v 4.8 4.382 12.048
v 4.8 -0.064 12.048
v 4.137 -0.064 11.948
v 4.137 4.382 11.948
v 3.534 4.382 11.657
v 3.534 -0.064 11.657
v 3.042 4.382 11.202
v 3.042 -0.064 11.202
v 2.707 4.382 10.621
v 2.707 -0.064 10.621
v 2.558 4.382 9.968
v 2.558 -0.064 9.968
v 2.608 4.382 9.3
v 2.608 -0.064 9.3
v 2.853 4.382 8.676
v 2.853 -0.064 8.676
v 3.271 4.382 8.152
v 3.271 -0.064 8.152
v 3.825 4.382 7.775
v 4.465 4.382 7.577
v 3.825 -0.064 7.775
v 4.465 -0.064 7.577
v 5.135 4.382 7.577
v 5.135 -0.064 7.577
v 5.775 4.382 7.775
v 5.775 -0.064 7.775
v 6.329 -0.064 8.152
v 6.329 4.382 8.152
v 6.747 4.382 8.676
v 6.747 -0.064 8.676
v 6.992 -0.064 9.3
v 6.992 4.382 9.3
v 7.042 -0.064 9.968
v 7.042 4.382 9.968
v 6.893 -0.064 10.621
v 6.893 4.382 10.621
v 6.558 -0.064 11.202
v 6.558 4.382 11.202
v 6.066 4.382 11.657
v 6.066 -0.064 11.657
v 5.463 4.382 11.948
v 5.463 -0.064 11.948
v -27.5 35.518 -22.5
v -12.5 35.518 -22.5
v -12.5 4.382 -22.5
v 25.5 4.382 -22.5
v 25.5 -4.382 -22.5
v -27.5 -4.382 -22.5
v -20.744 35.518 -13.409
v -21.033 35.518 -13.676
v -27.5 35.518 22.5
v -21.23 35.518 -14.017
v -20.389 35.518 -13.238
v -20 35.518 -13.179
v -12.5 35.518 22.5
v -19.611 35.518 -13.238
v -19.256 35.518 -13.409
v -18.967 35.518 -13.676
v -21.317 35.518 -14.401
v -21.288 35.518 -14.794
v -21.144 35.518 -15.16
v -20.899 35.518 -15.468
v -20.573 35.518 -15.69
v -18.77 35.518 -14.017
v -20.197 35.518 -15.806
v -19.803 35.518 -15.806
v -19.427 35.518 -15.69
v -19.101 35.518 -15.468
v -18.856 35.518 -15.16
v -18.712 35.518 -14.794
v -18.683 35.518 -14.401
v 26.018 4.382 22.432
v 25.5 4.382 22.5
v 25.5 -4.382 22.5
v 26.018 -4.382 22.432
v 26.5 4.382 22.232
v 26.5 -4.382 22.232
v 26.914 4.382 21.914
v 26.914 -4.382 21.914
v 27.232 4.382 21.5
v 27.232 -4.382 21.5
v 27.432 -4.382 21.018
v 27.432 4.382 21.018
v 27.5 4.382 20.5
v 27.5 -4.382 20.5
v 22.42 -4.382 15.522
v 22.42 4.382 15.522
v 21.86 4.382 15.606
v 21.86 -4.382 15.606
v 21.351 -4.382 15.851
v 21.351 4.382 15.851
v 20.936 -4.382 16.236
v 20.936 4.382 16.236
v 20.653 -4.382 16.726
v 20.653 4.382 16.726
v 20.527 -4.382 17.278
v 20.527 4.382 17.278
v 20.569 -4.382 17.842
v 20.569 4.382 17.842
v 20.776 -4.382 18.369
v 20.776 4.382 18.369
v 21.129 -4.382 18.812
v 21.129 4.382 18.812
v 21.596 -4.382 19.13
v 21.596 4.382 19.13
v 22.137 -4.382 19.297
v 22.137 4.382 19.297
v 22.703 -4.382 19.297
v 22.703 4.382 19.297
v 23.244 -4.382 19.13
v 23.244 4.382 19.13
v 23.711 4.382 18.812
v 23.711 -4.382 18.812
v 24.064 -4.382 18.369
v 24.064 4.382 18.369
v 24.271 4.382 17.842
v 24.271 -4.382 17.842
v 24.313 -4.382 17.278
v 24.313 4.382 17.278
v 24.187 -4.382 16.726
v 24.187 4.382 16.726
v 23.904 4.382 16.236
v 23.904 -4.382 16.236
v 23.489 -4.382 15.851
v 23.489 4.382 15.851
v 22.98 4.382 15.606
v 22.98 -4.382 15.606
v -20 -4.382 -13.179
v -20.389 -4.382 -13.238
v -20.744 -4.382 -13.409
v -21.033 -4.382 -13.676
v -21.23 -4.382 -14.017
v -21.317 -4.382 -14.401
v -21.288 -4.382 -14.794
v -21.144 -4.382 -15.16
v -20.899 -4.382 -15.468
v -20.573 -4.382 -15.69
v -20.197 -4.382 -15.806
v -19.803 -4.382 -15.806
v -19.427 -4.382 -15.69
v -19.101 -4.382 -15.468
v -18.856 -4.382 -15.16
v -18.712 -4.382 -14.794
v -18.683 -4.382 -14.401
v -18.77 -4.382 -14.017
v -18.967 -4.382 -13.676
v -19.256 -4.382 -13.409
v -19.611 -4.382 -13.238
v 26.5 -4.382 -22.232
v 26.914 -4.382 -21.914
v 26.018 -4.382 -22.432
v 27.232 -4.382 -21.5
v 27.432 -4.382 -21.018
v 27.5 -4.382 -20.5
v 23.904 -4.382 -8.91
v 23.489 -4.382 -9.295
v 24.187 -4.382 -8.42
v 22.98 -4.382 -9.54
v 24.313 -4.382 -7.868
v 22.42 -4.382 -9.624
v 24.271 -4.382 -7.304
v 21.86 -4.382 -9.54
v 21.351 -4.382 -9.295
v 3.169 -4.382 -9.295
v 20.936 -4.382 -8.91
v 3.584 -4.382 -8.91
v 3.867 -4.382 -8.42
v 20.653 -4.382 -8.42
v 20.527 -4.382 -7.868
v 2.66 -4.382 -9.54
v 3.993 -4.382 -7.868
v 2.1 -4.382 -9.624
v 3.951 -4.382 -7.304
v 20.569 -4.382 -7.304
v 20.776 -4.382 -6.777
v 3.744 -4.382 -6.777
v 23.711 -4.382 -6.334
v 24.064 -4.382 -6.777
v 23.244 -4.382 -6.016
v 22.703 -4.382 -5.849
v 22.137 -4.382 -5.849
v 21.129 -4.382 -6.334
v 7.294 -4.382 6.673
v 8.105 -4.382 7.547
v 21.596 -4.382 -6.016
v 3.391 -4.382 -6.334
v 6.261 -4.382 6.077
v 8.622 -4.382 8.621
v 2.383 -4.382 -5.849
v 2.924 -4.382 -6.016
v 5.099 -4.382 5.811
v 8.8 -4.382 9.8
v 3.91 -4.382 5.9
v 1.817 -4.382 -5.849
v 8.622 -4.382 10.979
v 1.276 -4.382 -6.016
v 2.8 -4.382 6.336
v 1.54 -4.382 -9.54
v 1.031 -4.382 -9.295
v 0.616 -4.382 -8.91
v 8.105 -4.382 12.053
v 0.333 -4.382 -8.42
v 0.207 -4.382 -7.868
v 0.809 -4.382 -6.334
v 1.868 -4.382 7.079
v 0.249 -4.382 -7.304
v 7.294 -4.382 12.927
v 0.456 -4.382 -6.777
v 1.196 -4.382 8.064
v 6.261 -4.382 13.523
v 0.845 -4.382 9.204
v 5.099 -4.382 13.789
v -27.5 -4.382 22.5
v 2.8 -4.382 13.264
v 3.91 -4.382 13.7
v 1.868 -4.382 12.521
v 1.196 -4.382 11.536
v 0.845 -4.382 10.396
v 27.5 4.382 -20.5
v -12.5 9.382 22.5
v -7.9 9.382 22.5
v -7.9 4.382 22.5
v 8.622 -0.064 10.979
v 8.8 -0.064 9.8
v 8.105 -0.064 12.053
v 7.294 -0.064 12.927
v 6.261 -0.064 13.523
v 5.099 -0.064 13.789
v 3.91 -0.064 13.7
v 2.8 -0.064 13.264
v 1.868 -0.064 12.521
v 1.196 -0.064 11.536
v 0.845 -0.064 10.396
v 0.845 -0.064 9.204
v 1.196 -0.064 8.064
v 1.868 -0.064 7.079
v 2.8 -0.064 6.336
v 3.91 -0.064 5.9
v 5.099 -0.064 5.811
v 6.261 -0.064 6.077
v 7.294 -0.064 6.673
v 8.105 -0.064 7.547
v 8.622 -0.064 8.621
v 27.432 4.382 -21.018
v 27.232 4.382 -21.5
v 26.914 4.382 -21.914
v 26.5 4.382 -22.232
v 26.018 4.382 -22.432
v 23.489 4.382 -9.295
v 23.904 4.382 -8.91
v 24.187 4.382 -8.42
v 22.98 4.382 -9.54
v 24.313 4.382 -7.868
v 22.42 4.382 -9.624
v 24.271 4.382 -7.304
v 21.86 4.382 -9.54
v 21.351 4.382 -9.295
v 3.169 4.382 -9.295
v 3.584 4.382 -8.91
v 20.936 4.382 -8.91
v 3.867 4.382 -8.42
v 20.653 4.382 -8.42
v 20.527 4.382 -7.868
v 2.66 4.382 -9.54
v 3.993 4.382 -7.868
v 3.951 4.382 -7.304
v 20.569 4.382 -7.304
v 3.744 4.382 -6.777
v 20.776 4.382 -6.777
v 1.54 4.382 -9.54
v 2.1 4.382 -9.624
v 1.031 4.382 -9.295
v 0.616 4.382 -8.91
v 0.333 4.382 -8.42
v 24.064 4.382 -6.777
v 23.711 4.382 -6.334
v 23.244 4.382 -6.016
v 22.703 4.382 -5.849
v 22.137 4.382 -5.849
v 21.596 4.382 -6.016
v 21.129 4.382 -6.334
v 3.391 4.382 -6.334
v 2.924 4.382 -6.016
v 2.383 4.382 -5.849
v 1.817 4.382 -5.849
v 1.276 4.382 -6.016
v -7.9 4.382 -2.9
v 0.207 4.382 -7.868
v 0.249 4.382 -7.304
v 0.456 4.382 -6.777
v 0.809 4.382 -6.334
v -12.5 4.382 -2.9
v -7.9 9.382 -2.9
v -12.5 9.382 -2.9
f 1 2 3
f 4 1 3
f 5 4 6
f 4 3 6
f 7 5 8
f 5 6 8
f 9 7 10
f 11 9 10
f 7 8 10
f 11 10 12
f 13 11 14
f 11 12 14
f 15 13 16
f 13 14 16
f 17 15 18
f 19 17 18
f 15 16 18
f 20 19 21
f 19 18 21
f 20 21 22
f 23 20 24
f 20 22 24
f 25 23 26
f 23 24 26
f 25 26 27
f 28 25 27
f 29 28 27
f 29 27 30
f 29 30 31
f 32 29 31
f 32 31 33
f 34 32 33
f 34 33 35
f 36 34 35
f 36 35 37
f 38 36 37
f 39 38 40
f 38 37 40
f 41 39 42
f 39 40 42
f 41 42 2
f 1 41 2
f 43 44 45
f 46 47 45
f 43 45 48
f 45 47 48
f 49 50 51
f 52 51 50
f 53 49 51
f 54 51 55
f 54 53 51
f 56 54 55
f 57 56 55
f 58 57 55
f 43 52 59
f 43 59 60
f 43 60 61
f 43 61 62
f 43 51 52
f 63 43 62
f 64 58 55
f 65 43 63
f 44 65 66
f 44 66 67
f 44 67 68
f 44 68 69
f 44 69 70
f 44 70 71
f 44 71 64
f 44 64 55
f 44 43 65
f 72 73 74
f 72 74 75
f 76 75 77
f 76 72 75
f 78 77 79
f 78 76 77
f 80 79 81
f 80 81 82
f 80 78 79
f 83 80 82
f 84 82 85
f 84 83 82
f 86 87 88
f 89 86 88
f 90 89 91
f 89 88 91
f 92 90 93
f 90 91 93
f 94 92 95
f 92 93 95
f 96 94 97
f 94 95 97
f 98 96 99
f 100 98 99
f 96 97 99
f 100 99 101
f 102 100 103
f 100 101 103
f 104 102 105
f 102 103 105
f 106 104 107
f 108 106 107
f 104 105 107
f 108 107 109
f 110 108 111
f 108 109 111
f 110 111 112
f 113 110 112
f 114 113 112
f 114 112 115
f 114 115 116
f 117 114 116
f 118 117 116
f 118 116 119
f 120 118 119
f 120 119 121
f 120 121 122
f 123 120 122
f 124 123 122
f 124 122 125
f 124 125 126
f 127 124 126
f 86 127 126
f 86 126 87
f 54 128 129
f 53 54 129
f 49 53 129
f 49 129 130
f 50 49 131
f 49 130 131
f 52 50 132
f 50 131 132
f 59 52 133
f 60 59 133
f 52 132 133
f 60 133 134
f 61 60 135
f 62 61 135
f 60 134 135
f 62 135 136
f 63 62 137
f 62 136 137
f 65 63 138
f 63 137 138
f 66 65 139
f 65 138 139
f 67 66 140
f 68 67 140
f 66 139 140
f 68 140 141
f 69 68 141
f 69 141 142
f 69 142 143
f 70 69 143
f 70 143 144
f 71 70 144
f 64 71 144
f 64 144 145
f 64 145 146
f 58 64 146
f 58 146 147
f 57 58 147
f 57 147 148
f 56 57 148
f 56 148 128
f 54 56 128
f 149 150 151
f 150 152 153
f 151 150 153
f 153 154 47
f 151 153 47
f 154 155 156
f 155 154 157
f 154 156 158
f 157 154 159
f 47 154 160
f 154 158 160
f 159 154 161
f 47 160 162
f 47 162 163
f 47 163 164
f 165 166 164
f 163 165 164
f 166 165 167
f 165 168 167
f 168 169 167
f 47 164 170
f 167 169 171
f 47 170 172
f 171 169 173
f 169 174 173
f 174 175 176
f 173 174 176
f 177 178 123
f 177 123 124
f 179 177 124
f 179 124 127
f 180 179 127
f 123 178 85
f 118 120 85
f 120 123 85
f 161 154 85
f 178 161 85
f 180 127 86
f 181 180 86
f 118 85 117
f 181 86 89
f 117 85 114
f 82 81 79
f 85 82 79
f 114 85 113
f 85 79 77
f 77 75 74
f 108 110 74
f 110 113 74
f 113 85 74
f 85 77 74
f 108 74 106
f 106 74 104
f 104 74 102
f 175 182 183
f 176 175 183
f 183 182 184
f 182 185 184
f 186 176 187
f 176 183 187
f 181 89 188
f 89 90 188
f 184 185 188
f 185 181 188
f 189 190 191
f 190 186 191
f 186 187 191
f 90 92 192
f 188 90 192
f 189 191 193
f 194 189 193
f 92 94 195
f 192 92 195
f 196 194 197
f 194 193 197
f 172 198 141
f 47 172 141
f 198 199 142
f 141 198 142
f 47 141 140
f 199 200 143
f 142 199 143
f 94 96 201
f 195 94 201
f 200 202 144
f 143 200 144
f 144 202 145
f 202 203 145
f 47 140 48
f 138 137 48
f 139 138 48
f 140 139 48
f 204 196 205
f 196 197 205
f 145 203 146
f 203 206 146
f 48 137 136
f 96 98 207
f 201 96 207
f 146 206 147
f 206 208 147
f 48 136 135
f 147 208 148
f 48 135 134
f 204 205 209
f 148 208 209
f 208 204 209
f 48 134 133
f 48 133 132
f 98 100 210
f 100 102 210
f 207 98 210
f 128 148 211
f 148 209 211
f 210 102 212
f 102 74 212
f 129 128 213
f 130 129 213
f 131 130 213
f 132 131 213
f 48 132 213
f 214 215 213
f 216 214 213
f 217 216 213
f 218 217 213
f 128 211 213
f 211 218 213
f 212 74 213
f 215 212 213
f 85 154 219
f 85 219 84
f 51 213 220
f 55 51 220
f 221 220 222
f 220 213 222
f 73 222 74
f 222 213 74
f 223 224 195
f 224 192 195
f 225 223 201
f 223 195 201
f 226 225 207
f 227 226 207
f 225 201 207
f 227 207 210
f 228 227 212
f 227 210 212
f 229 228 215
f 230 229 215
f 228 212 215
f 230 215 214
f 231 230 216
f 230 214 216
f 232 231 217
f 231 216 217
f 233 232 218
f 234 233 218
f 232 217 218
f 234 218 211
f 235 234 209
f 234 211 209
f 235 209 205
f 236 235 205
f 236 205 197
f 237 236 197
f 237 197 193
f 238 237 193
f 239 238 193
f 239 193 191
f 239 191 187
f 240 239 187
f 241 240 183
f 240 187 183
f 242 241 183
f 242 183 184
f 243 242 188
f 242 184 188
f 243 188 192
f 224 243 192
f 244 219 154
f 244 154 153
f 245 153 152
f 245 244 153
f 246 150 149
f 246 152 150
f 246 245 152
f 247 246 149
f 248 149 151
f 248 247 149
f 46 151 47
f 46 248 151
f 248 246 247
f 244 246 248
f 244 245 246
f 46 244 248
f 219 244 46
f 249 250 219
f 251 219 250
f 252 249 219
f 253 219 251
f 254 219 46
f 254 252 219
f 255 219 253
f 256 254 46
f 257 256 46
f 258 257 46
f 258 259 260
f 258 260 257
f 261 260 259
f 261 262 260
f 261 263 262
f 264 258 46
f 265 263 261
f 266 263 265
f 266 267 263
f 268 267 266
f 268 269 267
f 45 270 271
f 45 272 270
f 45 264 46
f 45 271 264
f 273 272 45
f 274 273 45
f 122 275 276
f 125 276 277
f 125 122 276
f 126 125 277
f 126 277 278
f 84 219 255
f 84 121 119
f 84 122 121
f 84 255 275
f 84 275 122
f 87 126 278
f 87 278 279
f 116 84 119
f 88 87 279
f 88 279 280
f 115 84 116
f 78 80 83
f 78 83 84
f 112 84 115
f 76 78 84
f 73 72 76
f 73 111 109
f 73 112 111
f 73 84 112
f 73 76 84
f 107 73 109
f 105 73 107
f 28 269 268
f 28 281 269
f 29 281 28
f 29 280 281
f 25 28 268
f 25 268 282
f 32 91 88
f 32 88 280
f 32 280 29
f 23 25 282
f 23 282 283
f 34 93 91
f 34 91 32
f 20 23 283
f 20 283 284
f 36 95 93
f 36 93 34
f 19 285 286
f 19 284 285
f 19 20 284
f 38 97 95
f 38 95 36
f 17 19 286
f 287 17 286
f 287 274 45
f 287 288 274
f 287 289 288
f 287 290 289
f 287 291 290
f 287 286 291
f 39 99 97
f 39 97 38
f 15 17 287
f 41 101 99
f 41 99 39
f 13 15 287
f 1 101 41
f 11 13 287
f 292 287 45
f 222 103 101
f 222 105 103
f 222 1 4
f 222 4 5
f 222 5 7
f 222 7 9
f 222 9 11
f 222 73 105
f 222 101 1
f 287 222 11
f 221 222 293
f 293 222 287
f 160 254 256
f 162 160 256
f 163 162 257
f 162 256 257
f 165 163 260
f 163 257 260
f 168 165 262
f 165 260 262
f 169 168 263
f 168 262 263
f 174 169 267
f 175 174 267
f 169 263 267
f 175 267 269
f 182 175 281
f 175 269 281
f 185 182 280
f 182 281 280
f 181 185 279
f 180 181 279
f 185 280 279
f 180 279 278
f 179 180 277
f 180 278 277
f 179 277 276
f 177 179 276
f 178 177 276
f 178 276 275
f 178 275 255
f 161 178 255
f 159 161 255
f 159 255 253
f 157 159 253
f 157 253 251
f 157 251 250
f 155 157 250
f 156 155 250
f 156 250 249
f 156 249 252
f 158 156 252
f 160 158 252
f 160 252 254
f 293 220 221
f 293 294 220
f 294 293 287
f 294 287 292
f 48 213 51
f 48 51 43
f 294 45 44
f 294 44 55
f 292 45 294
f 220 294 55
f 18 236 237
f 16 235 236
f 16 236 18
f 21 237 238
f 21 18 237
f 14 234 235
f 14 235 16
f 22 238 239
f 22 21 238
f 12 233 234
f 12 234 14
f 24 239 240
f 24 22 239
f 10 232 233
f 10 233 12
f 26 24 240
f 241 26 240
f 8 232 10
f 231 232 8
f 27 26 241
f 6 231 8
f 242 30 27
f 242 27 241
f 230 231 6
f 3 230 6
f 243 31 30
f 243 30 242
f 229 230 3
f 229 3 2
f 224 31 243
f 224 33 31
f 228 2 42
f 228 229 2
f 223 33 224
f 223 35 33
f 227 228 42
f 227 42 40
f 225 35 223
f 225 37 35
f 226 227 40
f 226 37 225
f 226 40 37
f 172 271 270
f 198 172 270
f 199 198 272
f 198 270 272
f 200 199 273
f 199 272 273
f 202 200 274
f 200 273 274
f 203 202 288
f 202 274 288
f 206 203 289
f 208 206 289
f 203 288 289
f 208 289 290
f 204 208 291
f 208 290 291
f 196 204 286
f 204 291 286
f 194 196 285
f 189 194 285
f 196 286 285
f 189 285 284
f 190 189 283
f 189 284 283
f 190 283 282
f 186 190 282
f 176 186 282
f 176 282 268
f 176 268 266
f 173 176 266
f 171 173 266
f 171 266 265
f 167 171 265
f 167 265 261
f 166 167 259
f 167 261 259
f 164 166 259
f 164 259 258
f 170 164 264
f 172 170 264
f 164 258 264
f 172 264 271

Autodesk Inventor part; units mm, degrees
ref_plane "YZ Plane" through (0, 0, 0) normal (1, 0, 0) x (0, 1, 0)
ref_plane "XZ Plane" through (0, 0, 0) normal (0, 1, 0) x (-1, 0, 0)
ref_plane "XY Plane" through (0, 0, 0) normal (0, 0, 1) x (1, 0, 0)
sketch "Sketch1" plane through (0, 0, 0) normal (0, 1, 0) x (-1, 0, 0)
  line L0 (-27.5, 22.5) -> (27.5, 22.5)
  line L1 (27.5, 22.5) -> (27.5, -22.5)
  line L2 (27.5, -22.5) -> (-27.5, -22.5)
  line L3 (-27.5, -22.5) -> (-27.5, 22.5)
  line L4 (-27.5, 22.5) -> (27.5, -22.5) construction
  line L5 (27.5, 22.5) -> (-27.5, -22.5) construction
  point P0 (0, 0)
  dimension "d0" = 45
  dimension "d1" = 55
extrude "Extrusion1" add sketch "Sketch1" along normal mid plane 8.763
sketch "Sketch2" plane through (0, 4.3815, 0) normal (0, 1, 0) x (1, 0, 0)
  line L0 (-27.5, -22.5) -> (27.5, -22.5) projected
  line L1 (27.5, -22.5) -> (27.5, 22.5) projected
  point P0 (4.8, -9.8)
  dimension "d11" = 12.7
  dimension "d12" = 22.7
hole "Hole1" at (4.8, 4.3815, 9.8) direction (0, -1, 0) diameter 4.496 end through all clearance for "Flat Head Machine Screw (82)" size "#8" standard "Ansi Unified Screw Threads"
sketch "Sketch3" plane through (0, 4.3815, 0) normal (0, 1, 0) x (1, 0, 0)
  line L0 (27.5, 22.5) -> (-27.5, 22.5) projected
  line L1 (-27.5, 22.5) -> (-12.5, 22.5)
  line L2 (-12.5, 22.5) -> (-12.5, -22.5)
  line L3 (-12.5, -22.5) -> (-27.5, -22.5)
  line L4 (-27.5, -22.5) -> (-27.5, 22.5)
  line L5 (-27.5, -22.5) -> (27.5, -22.5) projected
  point P0 (0, 0)
  dimension "d13" = 15
extrude "Extrusion2" add sketch "Sketch3" along normal blind 31.136
sketch "Sketch9" plane through (0, -4.3815, 0) normal (0, -1, 0) x (1, 0, 0)
  circle A0 centre (4.8, 9.8) radius 2.248 projected
  circle A1 centre (4.8, 9.8) radius 4
  point P0 (0, 0)
  dimension "d40" = 8
extrude "Extrusion8" cut sketch "Sketch9" against normal blind 4.318
sketch "Sketch10" plane through (0, -4.3815, 0) normal (0, -1, 0) x (1, 0, 0)
  line L0 (27.5, -22.5) -> (27.5, 22.5) projected
  line L1 (-27.5, -22.5) -> (27.5, -22.5) projected
  line L2 (27.5, 22.5) -> (-27.5, 22.5) projected
  point P0 (0, 0)
  point P1 (22.42, -7.726)
  point P2 (22.42, 17.42)
  point P3 (2.1, -7.726)
  dimension "d43" = 5.08
  dimension "d45" = 20.32
  dimension "d46" = 25.146
  dimension "d65" = 5.08
hole "Hole2" at (22.42, -4.3815, -7.726) at (22.42, -4.3815, 17.42) at (2.1, -4.3815, -7.726) direction (0, 1, 0) diameter 3.797 end through all clearance for "Flat Head Machine Screw (82)" size "#6" standard "Ansi Unified Screw Threads"
fillet "Fillet1" radius 2 2 edges at (27.5, 0, 22.5) (27.5, 0, -22.5)
sketch "Sketch13" plane through (0, 35.5175, 0) normal (0, 1, 0) x (1, 0, 0)
  line L0 (-12.5, 22.5) -> (-27.5, 22.5) projected
  point P0 (0, 0)
  point P1 (-20, 14.5)
  point P2 (-20, 22.5)
  dimension "d74" = 8
hole "Hole4" at (-20, 35.5175, -14.5) direction (0, -1, 0) diameter 2.642 end through all thread size "6-32 UNC" class "2B" standard "ANSI Unified Screw Threads"
sketch "Sketch14" plane through (0, 4.3815, 0) normal (0, 1, 0) x (1, 0, 0)
  line L0 (-12.5, -22.5) -> (-12.5, 22.5) projected
  line L1 (-12.5, -22.5) -> (-7.9, -22.5)
  line L2 (-7.9, -22.5) -> (-7.9, 2.9)
  line L3 (-7.9, 2.9) -> (-12.5, 2.9)
  line L4 (-12.5, 2.9) -> (-12.5, -22.5)
  point P0 (0, 0)
  dimension "d89" = 25.4
  dimension "d90" = 4.6
extrude "Extrusion11" add sketch "Sketch14" along normal blind 5
equation "\"d65\" = d43"
properties part number "BaseMount"
